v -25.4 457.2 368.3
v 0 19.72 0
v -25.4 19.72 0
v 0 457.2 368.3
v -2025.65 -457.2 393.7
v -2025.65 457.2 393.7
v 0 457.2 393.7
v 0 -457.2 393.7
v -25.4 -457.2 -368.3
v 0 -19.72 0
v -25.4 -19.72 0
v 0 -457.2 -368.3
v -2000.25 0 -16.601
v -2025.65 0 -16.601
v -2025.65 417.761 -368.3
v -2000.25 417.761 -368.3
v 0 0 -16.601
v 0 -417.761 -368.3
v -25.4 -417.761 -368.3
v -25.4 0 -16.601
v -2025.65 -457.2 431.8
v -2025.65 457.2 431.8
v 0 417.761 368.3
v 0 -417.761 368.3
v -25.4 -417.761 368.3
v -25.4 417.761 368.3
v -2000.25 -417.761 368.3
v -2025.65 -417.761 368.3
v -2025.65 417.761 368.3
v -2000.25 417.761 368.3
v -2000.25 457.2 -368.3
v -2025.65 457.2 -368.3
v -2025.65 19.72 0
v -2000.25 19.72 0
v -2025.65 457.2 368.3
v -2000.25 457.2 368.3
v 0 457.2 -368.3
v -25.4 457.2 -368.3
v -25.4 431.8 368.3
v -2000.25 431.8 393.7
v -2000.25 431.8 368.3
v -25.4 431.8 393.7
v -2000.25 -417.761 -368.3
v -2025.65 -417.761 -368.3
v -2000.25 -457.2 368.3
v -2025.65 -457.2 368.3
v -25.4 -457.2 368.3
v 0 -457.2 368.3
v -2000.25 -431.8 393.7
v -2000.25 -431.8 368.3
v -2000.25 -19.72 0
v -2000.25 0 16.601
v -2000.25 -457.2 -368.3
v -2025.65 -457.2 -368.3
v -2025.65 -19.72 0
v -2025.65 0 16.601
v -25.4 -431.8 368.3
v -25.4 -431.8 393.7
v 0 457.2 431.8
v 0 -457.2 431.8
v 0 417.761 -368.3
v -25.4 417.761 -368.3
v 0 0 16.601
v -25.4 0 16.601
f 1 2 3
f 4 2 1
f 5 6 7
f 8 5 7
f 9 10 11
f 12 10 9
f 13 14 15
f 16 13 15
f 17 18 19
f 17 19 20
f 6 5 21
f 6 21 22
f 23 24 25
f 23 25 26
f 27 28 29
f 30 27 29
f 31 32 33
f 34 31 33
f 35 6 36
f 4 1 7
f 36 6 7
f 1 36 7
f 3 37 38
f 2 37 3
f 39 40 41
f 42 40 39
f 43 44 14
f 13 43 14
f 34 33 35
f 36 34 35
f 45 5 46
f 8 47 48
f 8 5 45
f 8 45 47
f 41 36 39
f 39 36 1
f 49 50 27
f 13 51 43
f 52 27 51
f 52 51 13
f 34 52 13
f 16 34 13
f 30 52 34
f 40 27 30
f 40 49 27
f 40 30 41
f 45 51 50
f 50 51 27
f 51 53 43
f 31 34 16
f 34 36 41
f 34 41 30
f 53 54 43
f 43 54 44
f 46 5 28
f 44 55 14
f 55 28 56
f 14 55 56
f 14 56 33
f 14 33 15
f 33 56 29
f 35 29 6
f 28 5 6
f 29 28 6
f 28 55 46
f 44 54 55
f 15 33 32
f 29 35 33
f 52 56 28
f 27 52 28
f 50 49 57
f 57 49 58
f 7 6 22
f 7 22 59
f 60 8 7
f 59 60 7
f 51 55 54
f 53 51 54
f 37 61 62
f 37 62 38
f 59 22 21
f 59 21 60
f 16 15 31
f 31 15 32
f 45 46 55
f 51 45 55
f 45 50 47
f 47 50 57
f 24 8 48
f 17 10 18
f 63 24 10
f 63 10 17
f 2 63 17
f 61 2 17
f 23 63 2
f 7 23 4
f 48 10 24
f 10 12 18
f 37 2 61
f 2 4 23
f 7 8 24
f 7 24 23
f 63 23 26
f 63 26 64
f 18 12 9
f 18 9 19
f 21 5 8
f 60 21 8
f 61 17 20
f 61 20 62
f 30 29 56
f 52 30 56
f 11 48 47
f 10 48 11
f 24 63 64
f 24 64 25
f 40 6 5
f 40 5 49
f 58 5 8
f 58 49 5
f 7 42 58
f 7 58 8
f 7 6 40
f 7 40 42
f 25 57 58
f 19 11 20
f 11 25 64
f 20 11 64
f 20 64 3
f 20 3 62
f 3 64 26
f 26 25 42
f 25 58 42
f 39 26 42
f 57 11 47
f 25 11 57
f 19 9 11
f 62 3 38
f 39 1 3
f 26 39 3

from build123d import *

# Parameters (mm, degrees)
F1_DEPTH = 25.4
F5_W     = 2025.65
F5_H     = 914.4
F6_DEPTH = 38.1
F7_W     = 1974.85
F7_H     = 25.4
F7_W_2   = 2000.25
F8_DEPTH = 25.4


# Not quite as in the source:
# - a feature of the source that left no trace in its solid (it failed there, or was rolled back) is left out
# - a pattern or mirror of a feature is missing from the dataset's text; its kind, count and spacing are read off the source's solid


with BuildPart() as f1:
    # F0 (on Right) → F1 (new body)
    with BuildSketch(Plane.YZ):
        Polygon((-417.7607692471, 368.3), (-457.2, 368.3), (-19.7196153764, 0), (0, 16.6012799623), align=None)
        Polygon((-457.2, 393.7), (-457.2, 368.3), (-417.7607692471, 368.3), (417.7607692471, 368.3), (457.2, 368.3), (457.2, 393.7), align=None)
        Polygon((0, 16.6012799623), (-19.7196153764, 0), (0, -16.6012799623), (19.7196153764, 0), align=None)
        Polygon((0, -16.6012799623), (-19.7196153764, 0), (-457.2, -368.3), (-417.7607692471, -368.3), align=None)
        Polygon((19.7196153764, 0), (0, -16.6012799623), (417.7607692471, -368.3), (457.2, -368.3), align=None)
        Polygon((417.7607692471, 368.3), (0, 16.6012799623), (19.7196153764, 0), (457.2, 368.3), align=None)
    extrude(amount=-F1_DEPTH)


with BuildPart() as f1_copies_1:
    # F1_copies: instance of F1
    add(f1.part.mirror(Plane(origin=(-1012.825, 0, 0), x_dir=(0, 0, -1), z_dir=(-1, 0, 0))))


with BuildPart() as f6:
    # F5 (on face) → F6 (new body)
    with BuildSketch(Plane.XY.offset(393.7)):
        with Locations((-1012.825, 0)):
            Rectangle(F5_W, F5_H)
    extrude(amount=F6_DEPTH)


with BuildPart() as f1_1:
    add(f1.part)

    add(f1_copies_1.part)  # F8 merges F1_copies_1
    # F7 (on face) → F8 (join)
    with BuildSketch(Plane.XY.offset(393.7)):
        with Locations((-1012.825, 444.5)):
            Rectangle(F7_W, F7_H)
        with Locations((-1025.525, -444.5)):
            Rectangle(F7_W_2, F7_H)
    extrude(amount=-F8_DEPTH)


solid = Compound([f6.part, f1_1.part])
